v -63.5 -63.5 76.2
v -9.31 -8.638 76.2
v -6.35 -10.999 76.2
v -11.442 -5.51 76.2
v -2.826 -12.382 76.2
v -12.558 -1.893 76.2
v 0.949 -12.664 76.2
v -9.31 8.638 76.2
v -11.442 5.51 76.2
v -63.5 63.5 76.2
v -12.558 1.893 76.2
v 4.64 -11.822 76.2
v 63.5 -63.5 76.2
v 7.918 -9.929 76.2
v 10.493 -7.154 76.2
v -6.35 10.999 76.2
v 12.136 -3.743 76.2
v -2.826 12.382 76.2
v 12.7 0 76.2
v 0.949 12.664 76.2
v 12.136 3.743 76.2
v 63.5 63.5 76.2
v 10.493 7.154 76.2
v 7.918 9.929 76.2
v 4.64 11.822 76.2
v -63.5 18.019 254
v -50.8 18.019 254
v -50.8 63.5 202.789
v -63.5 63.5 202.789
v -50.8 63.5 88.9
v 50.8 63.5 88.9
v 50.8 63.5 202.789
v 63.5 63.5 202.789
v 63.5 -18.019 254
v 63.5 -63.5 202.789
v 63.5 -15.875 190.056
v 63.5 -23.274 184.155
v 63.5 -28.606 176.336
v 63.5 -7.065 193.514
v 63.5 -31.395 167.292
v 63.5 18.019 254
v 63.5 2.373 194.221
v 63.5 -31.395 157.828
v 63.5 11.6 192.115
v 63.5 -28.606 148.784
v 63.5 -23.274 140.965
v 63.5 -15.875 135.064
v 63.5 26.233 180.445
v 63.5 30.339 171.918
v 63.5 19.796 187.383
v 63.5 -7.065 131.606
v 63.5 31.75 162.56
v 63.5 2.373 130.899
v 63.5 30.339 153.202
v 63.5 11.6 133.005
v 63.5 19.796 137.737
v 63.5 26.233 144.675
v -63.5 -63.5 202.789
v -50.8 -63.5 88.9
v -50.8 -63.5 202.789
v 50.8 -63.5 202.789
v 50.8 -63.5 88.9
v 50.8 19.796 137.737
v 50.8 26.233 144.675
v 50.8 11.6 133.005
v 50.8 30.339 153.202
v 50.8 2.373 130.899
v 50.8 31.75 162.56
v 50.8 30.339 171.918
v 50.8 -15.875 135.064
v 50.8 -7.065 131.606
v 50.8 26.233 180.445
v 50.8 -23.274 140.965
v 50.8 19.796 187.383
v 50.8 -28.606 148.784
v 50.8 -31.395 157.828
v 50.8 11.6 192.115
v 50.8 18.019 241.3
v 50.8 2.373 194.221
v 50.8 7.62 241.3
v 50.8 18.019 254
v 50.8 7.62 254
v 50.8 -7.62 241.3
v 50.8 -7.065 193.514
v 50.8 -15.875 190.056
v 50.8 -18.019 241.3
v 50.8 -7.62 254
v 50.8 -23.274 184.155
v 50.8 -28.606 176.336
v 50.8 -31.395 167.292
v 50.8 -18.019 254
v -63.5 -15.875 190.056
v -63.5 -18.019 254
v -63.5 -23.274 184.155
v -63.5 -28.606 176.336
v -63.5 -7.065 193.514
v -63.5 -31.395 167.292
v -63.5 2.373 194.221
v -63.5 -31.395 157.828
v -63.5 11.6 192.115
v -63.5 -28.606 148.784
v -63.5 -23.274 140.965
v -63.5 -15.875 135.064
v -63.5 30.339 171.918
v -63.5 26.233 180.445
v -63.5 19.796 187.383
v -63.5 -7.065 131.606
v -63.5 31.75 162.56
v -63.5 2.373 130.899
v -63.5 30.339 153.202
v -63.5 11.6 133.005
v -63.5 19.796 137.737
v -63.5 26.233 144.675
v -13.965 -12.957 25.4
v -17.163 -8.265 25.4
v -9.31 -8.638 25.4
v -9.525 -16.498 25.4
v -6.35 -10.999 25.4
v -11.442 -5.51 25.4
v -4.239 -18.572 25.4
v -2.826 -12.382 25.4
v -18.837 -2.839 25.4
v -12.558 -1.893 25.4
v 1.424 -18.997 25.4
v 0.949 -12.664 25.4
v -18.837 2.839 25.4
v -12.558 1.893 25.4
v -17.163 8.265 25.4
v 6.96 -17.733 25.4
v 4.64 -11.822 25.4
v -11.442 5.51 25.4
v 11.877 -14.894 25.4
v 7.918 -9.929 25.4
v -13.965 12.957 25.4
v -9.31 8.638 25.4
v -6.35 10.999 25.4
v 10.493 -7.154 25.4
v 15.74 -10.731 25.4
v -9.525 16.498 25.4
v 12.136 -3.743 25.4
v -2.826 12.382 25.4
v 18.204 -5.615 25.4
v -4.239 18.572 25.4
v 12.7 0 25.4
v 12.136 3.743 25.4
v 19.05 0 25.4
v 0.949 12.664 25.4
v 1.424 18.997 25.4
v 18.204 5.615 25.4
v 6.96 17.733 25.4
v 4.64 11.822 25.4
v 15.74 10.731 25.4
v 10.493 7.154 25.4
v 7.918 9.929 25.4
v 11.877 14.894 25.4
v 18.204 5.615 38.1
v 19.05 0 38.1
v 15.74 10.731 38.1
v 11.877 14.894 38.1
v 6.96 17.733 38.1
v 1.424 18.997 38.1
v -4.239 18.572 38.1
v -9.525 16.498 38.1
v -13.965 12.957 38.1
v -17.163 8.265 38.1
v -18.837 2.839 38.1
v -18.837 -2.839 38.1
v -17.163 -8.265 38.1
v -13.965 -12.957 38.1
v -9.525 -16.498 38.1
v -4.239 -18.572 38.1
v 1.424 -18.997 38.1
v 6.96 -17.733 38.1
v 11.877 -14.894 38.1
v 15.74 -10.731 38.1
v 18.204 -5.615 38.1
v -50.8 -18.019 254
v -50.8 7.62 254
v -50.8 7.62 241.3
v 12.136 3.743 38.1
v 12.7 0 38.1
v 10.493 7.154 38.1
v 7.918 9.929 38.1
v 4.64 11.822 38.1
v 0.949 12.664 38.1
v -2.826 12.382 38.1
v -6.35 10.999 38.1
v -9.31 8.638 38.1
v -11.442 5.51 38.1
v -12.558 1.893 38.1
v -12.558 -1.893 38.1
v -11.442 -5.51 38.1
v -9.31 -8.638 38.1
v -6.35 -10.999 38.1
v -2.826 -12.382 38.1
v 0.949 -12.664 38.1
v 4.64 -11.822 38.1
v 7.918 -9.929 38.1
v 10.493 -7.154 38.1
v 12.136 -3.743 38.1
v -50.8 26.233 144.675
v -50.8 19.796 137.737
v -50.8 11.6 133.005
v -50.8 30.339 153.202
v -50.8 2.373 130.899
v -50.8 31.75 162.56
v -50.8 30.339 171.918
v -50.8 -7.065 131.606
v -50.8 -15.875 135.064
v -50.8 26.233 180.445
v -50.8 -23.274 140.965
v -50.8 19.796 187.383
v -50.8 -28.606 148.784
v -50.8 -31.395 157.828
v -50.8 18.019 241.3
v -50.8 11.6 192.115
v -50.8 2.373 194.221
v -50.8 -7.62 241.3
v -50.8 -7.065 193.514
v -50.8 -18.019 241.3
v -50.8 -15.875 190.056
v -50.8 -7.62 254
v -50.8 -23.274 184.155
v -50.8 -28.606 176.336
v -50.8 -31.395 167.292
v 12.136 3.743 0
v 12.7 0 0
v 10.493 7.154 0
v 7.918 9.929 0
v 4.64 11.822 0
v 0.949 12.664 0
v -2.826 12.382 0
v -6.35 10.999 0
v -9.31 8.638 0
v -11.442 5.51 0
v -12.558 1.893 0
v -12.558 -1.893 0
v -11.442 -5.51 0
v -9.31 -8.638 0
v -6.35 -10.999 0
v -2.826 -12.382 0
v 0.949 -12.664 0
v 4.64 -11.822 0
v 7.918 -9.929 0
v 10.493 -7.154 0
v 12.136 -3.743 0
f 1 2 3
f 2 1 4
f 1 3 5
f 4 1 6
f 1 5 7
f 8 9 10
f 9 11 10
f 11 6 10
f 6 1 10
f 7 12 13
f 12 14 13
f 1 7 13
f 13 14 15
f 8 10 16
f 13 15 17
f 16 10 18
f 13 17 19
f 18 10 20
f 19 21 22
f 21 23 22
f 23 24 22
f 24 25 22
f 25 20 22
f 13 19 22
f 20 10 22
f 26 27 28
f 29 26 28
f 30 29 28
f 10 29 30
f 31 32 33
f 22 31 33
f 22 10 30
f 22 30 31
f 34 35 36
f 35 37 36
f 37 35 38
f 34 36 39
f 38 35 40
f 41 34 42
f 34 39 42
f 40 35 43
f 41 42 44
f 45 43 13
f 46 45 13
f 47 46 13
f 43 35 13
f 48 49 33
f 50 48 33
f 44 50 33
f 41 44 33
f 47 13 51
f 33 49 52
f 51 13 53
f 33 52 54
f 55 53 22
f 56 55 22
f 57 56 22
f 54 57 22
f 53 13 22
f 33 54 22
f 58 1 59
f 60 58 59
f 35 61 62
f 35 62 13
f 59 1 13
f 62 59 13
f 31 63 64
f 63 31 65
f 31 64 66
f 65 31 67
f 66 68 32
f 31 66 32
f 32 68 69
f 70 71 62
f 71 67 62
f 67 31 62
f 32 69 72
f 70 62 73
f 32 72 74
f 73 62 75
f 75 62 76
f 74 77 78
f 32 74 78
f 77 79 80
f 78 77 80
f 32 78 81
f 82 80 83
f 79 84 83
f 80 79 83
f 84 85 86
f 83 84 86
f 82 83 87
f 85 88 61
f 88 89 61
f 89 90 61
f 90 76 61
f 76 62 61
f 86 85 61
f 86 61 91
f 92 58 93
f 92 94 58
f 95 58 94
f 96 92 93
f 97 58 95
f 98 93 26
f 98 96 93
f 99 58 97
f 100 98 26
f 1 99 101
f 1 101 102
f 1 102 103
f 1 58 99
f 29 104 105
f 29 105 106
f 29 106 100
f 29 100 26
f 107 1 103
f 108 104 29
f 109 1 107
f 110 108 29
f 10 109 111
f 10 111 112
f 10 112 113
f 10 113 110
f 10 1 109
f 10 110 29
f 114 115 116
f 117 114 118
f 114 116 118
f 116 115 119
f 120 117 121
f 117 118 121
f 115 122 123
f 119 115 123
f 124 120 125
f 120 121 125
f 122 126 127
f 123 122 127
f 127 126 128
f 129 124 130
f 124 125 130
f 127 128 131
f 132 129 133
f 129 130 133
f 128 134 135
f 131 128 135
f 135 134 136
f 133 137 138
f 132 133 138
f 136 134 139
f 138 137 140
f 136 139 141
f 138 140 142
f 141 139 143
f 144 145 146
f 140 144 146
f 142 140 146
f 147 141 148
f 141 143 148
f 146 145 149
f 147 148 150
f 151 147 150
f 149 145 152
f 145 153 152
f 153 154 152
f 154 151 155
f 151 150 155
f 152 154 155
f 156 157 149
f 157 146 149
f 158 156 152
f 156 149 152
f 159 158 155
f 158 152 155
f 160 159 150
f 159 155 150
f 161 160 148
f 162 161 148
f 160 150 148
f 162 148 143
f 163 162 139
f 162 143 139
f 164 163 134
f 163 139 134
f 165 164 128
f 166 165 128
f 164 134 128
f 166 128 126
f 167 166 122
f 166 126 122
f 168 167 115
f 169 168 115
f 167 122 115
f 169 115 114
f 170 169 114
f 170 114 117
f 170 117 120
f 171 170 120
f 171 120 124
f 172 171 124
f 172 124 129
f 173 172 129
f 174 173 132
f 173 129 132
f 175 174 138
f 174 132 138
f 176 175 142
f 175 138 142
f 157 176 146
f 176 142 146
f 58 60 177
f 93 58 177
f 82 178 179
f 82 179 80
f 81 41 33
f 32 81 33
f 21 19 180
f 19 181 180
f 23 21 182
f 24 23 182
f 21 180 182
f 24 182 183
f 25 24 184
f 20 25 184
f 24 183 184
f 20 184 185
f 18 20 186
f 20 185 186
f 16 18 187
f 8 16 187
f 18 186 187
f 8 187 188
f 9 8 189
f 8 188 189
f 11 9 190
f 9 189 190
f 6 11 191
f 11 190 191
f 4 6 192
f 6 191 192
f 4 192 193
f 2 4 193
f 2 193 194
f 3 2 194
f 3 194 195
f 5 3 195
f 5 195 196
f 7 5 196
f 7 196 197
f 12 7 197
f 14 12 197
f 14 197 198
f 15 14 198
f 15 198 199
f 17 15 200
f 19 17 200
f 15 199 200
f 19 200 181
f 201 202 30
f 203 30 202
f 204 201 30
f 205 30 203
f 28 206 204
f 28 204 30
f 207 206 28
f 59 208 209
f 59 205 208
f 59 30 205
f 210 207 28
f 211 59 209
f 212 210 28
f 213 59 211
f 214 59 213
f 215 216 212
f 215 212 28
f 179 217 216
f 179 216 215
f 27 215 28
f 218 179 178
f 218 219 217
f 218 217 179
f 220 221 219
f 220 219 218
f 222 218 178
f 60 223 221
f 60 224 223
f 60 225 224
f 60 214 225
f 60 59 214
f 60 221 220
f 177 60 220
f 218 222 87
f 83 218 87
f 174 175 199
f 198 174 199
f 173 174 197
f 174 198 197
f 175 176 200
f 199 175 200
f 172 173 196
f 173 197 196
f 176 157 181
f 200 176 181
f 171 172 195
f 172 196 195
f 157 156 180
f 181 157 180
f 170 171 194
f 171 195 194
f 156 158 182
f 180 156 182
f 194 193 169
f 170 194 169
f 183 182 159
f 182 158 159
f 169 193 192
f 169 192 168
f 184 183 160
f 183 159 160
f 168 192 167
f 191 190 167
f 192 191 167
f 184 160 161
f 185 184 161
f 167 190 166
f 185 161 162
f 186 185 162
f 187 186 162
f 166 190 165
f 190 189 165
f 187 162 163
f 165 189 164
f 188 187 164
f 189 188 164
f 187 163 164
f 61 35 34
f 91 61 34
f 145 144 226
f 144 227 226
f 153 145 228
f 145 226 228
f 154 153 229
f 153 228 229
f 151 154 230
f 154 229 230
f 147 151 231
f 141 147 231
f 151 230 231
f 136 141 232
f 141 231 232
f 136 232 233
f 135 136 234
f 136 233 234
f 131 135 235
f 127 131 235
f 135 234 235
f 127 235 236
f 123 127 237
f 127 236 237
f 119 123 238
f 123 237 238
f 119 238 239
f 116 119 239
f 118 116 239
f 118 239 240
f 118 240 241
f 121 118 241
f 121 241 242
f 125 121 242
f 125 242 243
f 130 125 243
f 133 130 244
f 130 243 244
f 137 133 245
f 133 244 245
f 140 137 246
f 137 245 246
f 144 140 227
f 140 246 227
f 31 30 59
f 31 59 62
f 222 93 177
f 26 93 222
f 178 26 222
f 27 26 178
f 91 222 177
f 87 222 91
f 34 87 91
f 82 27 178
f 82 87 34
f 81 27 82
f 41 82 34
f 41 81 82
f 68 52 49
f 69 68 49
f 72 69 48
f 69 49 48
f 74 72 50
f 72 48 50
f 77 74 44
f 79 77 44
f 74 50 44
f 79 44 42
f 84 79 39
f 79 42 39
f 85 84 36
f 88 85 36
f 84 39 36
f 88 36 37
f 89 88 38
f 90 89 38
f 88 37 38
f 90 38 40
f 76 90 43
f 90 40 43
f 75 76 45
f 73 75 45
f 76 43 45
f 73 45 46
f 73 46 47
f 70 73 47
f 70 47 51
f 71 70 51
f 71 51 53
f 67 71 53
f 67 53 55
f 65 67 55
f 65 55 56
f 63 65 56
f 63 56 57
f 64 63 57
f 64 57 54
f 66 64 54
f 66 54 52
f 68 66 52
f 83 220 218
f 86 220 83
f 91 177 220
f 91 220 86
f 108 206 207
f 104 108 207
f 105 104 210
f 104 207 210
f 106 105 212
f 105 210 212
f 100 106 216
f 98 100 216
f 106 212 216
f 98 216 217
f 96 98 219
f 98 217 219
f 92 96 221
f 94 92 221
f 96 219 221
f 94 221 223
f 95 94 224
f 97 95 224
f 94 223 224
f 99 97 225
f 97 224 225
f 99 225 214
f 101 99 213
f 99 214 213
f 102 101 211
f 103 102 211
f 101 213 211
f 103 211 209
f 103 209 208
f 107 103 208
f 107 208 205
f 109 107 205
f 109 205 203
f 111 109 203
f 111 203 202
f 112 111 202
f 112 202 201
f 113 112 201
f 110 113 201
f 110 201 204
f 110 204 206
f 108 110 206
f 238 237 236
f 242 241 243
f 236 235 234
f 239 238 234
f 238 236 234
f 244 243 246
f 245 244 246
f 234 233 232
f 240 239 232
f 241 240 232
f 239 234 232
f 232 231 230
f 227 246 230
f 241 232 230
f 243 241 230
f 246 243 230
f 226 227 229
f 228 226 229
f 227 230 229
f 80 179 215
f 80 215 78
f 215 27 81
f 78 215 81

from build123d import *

# Parameters (mm, degrees)
F0_W      = 127
F0_H      = 127
F1_DEPTH  = 254
F5_W      = 101.6
F5_H      = 152.4
F6_DEPTH  = 127
F8_R      = 31.75
F9_DEPTH  = 254
F11_W     = 101.6
F11_H     = 25.9214961534
F11_H_2   = 7.62
F12_DEPTH = 25.4


with BuildPart() as f1:
    # F0 (on Top) → F1 (new body)
    with BuildSketch(Plane.XY):
        Rectangle(F0_W, F0_H)
    extrude(amount=F1_DEPTH)

    # F2 (on Front) → F3 (revolve, cut)
    with BuildSketch(Plane.XZ):
        Polygon((12.7, 25.4), (12.7, 0), (118.2309914892, 0), (118.2309914892, 76.2), (12.7, 76.2), (12.7, 38.1), (19.05, 38.1), (19.05, 25.4), align=None)
    revolve(axis=Axis((0, 0, 127.3276656866), (0, 0, 1)), mode=Mode.SUBTRACT)

    # F5 (on offset) → F6 (cut, through all)
    with BuildSketch(Plane.XZ.offset(63.5)):
        with Locations((0, 165.1)):
            Rectangle(F5_W, F5_H)
    extrude(amount=-F6_DEPTH, mode=Mode.SUBTRACT)

    # F8 (on offset) → F9 (cut)
    with BuildSketch(Plane.YZ.offset(63.5)):
        Polygon((-67.3566020369, 261.3644381861), (-66.4902816981, 199.4223662228), (-11.4787761731, 261.3644381861), align=None)
        Polygon((11.4787761731, 261.3644381861), (66.4902816981, 199.4223662228), (67.3566020369, 261.3644381861), align=None)
        with Locations((0, 162.56)):
            Circle(F8_R)
    extrude(amount=-F9_DEPTH, mode=Mode.SUBTRACT)

    # F11 (on offset) → F12 (cut)
    with BuildSketch(Plane.XY.offset(254)):
        with Locations((0, 30.9799711404)):
            Rectangle(F11_W, F11_H)
        with Locations((0, -30.9799711404)):
            Rectangle(F11_W, F11_H)
        with Locations((0, 3.81)):
            Rectangle(F11_W, F11_H_2)
        with Locations((0, -3.81)):
            Rectangle(F11_W, F11_H_2)
    extrude(amount=-F12_DEPTH, mode=Mode.SUBTRACT)


solid = f1.part
